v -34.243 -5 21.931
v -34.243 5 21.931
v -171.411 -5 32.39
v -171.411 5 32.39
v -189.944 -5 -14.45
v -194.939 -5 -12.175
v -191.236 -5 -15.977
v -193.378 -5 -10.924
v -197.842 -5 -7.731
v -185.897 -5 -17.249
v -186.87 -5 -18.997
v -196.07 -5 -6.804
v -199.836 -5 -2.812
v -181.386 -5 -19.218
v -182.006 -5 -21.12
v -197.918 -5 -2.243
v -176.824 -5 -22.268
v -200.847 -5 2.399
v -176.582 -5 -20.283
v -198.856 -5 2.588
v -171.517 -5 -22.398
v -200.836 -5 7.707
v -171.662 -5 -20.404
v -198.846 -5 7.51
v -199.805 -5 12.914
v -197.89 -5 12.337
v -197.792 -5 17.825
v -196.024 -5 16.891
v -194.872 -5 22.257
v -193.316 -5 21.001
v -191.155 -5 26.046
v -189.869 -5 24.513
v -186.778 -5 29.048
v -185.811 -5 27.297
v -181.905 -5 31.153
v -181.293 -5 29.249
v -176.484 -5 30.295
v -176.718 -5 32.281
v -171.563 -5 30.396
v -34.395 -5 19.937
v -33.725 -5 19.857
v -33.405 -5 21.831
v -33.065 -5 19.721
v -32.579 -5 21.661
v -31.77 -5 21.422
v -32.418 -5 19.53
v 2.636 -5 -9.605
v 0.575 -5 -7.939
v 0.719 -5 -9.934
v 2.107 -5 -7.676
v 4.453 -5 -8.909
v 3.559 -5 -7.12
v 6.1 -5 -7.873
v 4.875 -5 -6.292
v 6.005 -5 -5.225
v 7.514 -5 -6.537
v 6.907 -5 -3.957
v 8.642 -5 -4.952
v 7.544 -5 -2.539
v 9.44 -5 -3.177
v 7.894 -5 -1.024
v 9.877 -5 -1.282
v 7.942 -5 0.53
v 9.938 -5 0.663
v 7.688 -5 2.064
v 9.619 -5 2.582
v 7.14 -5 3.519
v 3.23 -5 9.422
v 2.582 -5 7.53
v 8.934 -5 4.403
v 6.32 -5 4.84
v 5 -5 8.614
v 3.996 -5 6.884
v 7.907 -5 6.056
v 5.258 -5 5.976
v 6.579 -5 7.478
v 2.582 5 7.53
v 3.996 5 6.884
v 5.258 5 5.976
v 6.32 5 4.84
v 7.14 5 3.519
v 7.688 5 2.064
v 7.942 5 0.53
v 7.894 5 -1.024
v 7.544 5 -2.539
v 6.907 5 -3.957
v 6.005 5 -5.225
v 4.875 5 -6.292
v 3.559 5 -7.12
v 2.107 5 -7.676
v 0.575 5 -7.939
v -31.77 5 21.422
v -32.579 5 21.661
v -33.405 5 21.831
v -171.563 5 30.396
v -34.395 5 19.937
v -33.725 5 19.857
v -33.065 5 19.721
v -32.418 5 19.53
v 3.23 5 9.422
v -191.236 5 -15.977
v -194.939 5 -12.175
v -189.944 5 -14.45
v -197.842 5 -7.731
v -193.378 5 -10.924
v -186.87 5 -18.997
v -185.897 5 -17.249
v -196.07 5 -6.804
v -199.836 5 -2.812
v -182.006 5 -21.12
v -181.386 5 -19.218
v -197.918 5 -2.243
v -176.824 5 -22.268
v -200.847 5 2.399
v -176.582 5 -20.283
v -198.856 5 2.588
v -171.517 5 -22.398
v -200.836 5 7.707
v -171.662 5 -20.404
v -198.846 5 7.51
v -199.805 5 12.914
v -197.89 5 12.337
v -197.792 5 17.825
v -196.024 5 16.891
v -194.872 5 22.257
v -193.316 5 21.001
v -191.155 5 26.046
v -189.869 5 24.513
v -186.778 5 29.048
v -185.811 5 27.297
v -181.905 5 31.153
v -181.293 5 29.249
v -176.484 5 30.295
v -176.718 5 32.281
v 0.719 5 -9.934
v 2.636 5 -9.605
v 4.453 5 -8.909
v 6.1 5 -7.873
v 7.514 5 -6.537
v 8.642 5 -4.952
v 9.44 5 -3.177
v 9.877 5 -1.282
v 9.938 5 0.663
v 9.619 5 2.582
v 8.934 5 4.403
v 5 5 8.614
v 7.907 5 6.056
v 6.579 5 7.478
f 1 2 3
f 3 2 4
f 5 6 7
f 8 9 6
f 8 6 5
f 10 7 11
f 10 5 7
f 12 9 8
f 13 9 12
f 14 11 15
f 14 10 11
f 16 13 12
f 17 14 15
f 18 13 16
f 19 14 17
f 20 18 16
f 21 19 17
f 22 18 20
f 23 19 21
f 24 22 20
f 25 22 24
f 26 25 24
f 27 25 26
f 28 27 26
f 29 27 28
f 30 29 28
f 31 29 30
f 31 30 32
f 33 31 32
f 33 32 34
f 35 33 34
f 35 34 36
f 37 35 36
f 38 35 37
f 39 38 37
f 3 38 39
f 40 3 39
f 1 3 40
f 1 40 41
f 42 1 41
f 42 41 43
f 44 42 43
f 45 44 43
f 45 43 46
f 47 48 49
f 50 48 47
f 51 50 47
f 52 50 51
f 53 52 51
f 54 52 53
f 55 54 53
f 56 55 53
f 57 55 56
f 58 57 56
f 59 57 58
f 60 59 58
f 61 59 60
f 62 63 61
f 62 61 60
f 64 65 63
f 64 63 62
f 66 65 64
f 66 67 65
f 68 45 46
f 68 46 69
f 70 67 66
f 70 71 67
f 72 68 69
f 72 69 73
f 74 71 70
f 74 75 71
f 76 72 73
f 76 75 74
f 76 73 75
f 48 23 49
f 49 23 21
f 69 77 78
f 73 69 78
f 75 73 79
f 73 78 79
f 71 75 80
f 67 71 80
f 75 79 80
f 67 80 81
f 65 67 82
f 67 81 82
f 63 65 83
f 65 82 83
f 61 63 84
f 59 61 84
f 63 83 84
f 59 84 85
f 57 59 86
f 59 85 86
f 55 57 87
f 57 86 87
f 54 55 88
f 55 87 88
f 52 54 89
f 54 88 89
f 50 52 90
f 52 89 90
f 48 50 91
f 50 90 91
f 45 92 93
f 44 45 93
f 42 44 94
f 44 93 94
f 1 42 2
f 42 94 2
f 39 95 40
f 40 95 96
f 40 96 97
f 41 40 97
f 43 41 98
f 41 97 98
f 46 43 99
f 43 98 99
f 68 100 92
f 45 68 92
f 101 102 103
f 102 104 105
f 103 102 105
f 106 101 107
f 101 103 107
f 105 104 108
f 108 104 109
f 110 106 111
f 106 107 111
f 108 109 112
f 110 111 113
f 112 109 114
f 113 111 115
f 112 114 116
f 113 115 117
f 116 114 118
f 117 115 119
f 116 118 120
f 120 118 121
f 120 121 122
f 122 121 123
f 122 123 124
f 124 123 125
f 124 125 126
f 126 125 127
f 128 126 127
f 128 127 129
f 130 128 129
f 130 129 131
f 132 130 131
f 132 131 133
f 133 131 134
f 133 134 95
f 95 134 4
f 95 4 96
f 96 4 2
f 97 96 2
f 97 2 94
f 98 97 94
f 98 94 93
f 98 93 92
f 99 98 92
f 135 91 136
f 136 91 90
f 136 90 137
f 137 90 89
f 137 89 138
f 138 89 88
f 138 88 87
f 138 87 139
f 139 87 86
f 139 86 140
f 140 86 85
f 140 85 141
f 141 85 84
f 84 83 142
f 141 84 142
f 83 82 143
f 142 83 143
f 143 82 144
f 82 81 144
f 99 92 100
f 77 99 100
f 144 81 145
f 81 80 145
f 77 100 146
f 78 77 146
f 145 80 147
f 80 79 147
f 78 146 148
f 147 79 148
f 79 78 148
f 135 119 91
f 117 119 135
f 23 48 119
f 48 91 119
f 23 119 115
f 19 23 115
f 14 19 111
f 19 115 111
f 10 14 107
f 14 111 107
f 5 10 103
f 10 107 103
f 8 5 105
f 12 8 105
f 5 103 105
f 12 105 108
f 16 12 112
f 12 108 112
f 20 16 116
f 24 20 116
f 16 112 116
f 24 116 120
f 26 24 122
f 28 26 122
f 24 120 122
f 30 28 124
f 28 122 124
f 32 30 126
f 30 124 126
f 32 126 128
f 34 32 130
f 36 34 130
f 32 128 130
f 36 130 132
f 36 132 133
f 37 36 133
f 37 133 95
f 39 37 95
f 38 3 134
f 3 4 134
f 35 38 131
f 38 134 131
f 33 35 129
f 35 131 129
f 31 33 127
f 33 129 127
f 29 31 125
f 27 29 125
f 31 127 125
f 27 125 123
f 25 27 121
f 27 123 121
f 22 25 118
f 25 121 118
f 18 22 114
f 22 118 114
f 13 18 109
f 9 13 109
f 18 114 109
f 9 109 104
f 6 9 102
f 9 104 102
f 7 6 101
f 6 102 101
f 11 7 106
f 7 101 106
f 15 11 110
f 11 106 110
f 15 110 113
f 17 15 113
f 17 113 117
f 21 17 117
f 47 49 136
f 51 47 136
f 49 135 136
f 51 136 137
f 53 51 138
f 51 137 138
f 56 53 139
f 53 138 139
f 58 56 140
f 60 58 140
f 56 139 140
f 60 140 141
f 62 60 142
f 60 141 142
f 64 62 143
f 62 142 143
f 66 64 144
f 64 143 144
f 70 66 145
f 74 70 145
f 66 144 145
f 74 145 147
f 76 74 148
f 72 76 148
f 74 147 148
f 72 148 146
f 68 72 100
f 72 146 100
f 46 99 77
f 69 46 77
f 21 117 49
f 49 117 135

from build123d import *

# Parameters (mm, degrees)
SALIENTE_EXTRUIR1_DEPTH = 5


with BuildPart() as part:
    # Croquis1 → Saliente-Extruir1 (new, symmetric)
    with BuildSketch(Plane(origin=(0, 0, 0), x_dir=(-1, 0, 0), z_dir=(0, 1, 0))):
        with BuildLine():
            Line((34.242733527, 21.931170499), (171.411434738, 32.390487311))
            ThreePointArc((171.411434738, 32.390487311), (200.969948773, 5.053051121), (171.517245245, -22.398350016))
            Line((171.517245245, -22.398350016), (-0.718901979, -9.934021338))
            ThreePointArc((-0.718901979, -9.934021338), (-9.877207042, -1.281554151), (-3.23027027, 9.421621622))
            Line((-3.23027027, 9.421621622), (31.76972973, 21.421621622))
            ThreePointArc((31.76972973, 21.421621622), (32.99001932, 21.755079583), (34.242733527, 21.931170499))
        make_face()
        with BuildLine():
            Line((-0.574544152, -7.939237937), (171.661603072, -20.403566614))
            ThreePointArc((171.661603072, -20.403566614), (198.969952502, 5.049188644), (171.563496279, 30.396276368))
            Line((171.563496279, 30.396276368), (34.394795068, 19.936959556))
            ThreePointArc((34.394795068, 19.936959556), (33.393629898, 19.796228261), (32.418378378, 19.52972973))
            Line((32.418378378, 19.52972973), (-2.581621622, 7.52972973))
            ThreePointArc((-2.581621622, 7.52972973), (-7.893832134, -1.02421396), (-0.574544152, -7.939237937))
        make_face(mode=Mode.SUBTRACT)
    extrude(amount=SALIENTE_EXTRUIR1_DEPTH, both=True)


solid = part.part
